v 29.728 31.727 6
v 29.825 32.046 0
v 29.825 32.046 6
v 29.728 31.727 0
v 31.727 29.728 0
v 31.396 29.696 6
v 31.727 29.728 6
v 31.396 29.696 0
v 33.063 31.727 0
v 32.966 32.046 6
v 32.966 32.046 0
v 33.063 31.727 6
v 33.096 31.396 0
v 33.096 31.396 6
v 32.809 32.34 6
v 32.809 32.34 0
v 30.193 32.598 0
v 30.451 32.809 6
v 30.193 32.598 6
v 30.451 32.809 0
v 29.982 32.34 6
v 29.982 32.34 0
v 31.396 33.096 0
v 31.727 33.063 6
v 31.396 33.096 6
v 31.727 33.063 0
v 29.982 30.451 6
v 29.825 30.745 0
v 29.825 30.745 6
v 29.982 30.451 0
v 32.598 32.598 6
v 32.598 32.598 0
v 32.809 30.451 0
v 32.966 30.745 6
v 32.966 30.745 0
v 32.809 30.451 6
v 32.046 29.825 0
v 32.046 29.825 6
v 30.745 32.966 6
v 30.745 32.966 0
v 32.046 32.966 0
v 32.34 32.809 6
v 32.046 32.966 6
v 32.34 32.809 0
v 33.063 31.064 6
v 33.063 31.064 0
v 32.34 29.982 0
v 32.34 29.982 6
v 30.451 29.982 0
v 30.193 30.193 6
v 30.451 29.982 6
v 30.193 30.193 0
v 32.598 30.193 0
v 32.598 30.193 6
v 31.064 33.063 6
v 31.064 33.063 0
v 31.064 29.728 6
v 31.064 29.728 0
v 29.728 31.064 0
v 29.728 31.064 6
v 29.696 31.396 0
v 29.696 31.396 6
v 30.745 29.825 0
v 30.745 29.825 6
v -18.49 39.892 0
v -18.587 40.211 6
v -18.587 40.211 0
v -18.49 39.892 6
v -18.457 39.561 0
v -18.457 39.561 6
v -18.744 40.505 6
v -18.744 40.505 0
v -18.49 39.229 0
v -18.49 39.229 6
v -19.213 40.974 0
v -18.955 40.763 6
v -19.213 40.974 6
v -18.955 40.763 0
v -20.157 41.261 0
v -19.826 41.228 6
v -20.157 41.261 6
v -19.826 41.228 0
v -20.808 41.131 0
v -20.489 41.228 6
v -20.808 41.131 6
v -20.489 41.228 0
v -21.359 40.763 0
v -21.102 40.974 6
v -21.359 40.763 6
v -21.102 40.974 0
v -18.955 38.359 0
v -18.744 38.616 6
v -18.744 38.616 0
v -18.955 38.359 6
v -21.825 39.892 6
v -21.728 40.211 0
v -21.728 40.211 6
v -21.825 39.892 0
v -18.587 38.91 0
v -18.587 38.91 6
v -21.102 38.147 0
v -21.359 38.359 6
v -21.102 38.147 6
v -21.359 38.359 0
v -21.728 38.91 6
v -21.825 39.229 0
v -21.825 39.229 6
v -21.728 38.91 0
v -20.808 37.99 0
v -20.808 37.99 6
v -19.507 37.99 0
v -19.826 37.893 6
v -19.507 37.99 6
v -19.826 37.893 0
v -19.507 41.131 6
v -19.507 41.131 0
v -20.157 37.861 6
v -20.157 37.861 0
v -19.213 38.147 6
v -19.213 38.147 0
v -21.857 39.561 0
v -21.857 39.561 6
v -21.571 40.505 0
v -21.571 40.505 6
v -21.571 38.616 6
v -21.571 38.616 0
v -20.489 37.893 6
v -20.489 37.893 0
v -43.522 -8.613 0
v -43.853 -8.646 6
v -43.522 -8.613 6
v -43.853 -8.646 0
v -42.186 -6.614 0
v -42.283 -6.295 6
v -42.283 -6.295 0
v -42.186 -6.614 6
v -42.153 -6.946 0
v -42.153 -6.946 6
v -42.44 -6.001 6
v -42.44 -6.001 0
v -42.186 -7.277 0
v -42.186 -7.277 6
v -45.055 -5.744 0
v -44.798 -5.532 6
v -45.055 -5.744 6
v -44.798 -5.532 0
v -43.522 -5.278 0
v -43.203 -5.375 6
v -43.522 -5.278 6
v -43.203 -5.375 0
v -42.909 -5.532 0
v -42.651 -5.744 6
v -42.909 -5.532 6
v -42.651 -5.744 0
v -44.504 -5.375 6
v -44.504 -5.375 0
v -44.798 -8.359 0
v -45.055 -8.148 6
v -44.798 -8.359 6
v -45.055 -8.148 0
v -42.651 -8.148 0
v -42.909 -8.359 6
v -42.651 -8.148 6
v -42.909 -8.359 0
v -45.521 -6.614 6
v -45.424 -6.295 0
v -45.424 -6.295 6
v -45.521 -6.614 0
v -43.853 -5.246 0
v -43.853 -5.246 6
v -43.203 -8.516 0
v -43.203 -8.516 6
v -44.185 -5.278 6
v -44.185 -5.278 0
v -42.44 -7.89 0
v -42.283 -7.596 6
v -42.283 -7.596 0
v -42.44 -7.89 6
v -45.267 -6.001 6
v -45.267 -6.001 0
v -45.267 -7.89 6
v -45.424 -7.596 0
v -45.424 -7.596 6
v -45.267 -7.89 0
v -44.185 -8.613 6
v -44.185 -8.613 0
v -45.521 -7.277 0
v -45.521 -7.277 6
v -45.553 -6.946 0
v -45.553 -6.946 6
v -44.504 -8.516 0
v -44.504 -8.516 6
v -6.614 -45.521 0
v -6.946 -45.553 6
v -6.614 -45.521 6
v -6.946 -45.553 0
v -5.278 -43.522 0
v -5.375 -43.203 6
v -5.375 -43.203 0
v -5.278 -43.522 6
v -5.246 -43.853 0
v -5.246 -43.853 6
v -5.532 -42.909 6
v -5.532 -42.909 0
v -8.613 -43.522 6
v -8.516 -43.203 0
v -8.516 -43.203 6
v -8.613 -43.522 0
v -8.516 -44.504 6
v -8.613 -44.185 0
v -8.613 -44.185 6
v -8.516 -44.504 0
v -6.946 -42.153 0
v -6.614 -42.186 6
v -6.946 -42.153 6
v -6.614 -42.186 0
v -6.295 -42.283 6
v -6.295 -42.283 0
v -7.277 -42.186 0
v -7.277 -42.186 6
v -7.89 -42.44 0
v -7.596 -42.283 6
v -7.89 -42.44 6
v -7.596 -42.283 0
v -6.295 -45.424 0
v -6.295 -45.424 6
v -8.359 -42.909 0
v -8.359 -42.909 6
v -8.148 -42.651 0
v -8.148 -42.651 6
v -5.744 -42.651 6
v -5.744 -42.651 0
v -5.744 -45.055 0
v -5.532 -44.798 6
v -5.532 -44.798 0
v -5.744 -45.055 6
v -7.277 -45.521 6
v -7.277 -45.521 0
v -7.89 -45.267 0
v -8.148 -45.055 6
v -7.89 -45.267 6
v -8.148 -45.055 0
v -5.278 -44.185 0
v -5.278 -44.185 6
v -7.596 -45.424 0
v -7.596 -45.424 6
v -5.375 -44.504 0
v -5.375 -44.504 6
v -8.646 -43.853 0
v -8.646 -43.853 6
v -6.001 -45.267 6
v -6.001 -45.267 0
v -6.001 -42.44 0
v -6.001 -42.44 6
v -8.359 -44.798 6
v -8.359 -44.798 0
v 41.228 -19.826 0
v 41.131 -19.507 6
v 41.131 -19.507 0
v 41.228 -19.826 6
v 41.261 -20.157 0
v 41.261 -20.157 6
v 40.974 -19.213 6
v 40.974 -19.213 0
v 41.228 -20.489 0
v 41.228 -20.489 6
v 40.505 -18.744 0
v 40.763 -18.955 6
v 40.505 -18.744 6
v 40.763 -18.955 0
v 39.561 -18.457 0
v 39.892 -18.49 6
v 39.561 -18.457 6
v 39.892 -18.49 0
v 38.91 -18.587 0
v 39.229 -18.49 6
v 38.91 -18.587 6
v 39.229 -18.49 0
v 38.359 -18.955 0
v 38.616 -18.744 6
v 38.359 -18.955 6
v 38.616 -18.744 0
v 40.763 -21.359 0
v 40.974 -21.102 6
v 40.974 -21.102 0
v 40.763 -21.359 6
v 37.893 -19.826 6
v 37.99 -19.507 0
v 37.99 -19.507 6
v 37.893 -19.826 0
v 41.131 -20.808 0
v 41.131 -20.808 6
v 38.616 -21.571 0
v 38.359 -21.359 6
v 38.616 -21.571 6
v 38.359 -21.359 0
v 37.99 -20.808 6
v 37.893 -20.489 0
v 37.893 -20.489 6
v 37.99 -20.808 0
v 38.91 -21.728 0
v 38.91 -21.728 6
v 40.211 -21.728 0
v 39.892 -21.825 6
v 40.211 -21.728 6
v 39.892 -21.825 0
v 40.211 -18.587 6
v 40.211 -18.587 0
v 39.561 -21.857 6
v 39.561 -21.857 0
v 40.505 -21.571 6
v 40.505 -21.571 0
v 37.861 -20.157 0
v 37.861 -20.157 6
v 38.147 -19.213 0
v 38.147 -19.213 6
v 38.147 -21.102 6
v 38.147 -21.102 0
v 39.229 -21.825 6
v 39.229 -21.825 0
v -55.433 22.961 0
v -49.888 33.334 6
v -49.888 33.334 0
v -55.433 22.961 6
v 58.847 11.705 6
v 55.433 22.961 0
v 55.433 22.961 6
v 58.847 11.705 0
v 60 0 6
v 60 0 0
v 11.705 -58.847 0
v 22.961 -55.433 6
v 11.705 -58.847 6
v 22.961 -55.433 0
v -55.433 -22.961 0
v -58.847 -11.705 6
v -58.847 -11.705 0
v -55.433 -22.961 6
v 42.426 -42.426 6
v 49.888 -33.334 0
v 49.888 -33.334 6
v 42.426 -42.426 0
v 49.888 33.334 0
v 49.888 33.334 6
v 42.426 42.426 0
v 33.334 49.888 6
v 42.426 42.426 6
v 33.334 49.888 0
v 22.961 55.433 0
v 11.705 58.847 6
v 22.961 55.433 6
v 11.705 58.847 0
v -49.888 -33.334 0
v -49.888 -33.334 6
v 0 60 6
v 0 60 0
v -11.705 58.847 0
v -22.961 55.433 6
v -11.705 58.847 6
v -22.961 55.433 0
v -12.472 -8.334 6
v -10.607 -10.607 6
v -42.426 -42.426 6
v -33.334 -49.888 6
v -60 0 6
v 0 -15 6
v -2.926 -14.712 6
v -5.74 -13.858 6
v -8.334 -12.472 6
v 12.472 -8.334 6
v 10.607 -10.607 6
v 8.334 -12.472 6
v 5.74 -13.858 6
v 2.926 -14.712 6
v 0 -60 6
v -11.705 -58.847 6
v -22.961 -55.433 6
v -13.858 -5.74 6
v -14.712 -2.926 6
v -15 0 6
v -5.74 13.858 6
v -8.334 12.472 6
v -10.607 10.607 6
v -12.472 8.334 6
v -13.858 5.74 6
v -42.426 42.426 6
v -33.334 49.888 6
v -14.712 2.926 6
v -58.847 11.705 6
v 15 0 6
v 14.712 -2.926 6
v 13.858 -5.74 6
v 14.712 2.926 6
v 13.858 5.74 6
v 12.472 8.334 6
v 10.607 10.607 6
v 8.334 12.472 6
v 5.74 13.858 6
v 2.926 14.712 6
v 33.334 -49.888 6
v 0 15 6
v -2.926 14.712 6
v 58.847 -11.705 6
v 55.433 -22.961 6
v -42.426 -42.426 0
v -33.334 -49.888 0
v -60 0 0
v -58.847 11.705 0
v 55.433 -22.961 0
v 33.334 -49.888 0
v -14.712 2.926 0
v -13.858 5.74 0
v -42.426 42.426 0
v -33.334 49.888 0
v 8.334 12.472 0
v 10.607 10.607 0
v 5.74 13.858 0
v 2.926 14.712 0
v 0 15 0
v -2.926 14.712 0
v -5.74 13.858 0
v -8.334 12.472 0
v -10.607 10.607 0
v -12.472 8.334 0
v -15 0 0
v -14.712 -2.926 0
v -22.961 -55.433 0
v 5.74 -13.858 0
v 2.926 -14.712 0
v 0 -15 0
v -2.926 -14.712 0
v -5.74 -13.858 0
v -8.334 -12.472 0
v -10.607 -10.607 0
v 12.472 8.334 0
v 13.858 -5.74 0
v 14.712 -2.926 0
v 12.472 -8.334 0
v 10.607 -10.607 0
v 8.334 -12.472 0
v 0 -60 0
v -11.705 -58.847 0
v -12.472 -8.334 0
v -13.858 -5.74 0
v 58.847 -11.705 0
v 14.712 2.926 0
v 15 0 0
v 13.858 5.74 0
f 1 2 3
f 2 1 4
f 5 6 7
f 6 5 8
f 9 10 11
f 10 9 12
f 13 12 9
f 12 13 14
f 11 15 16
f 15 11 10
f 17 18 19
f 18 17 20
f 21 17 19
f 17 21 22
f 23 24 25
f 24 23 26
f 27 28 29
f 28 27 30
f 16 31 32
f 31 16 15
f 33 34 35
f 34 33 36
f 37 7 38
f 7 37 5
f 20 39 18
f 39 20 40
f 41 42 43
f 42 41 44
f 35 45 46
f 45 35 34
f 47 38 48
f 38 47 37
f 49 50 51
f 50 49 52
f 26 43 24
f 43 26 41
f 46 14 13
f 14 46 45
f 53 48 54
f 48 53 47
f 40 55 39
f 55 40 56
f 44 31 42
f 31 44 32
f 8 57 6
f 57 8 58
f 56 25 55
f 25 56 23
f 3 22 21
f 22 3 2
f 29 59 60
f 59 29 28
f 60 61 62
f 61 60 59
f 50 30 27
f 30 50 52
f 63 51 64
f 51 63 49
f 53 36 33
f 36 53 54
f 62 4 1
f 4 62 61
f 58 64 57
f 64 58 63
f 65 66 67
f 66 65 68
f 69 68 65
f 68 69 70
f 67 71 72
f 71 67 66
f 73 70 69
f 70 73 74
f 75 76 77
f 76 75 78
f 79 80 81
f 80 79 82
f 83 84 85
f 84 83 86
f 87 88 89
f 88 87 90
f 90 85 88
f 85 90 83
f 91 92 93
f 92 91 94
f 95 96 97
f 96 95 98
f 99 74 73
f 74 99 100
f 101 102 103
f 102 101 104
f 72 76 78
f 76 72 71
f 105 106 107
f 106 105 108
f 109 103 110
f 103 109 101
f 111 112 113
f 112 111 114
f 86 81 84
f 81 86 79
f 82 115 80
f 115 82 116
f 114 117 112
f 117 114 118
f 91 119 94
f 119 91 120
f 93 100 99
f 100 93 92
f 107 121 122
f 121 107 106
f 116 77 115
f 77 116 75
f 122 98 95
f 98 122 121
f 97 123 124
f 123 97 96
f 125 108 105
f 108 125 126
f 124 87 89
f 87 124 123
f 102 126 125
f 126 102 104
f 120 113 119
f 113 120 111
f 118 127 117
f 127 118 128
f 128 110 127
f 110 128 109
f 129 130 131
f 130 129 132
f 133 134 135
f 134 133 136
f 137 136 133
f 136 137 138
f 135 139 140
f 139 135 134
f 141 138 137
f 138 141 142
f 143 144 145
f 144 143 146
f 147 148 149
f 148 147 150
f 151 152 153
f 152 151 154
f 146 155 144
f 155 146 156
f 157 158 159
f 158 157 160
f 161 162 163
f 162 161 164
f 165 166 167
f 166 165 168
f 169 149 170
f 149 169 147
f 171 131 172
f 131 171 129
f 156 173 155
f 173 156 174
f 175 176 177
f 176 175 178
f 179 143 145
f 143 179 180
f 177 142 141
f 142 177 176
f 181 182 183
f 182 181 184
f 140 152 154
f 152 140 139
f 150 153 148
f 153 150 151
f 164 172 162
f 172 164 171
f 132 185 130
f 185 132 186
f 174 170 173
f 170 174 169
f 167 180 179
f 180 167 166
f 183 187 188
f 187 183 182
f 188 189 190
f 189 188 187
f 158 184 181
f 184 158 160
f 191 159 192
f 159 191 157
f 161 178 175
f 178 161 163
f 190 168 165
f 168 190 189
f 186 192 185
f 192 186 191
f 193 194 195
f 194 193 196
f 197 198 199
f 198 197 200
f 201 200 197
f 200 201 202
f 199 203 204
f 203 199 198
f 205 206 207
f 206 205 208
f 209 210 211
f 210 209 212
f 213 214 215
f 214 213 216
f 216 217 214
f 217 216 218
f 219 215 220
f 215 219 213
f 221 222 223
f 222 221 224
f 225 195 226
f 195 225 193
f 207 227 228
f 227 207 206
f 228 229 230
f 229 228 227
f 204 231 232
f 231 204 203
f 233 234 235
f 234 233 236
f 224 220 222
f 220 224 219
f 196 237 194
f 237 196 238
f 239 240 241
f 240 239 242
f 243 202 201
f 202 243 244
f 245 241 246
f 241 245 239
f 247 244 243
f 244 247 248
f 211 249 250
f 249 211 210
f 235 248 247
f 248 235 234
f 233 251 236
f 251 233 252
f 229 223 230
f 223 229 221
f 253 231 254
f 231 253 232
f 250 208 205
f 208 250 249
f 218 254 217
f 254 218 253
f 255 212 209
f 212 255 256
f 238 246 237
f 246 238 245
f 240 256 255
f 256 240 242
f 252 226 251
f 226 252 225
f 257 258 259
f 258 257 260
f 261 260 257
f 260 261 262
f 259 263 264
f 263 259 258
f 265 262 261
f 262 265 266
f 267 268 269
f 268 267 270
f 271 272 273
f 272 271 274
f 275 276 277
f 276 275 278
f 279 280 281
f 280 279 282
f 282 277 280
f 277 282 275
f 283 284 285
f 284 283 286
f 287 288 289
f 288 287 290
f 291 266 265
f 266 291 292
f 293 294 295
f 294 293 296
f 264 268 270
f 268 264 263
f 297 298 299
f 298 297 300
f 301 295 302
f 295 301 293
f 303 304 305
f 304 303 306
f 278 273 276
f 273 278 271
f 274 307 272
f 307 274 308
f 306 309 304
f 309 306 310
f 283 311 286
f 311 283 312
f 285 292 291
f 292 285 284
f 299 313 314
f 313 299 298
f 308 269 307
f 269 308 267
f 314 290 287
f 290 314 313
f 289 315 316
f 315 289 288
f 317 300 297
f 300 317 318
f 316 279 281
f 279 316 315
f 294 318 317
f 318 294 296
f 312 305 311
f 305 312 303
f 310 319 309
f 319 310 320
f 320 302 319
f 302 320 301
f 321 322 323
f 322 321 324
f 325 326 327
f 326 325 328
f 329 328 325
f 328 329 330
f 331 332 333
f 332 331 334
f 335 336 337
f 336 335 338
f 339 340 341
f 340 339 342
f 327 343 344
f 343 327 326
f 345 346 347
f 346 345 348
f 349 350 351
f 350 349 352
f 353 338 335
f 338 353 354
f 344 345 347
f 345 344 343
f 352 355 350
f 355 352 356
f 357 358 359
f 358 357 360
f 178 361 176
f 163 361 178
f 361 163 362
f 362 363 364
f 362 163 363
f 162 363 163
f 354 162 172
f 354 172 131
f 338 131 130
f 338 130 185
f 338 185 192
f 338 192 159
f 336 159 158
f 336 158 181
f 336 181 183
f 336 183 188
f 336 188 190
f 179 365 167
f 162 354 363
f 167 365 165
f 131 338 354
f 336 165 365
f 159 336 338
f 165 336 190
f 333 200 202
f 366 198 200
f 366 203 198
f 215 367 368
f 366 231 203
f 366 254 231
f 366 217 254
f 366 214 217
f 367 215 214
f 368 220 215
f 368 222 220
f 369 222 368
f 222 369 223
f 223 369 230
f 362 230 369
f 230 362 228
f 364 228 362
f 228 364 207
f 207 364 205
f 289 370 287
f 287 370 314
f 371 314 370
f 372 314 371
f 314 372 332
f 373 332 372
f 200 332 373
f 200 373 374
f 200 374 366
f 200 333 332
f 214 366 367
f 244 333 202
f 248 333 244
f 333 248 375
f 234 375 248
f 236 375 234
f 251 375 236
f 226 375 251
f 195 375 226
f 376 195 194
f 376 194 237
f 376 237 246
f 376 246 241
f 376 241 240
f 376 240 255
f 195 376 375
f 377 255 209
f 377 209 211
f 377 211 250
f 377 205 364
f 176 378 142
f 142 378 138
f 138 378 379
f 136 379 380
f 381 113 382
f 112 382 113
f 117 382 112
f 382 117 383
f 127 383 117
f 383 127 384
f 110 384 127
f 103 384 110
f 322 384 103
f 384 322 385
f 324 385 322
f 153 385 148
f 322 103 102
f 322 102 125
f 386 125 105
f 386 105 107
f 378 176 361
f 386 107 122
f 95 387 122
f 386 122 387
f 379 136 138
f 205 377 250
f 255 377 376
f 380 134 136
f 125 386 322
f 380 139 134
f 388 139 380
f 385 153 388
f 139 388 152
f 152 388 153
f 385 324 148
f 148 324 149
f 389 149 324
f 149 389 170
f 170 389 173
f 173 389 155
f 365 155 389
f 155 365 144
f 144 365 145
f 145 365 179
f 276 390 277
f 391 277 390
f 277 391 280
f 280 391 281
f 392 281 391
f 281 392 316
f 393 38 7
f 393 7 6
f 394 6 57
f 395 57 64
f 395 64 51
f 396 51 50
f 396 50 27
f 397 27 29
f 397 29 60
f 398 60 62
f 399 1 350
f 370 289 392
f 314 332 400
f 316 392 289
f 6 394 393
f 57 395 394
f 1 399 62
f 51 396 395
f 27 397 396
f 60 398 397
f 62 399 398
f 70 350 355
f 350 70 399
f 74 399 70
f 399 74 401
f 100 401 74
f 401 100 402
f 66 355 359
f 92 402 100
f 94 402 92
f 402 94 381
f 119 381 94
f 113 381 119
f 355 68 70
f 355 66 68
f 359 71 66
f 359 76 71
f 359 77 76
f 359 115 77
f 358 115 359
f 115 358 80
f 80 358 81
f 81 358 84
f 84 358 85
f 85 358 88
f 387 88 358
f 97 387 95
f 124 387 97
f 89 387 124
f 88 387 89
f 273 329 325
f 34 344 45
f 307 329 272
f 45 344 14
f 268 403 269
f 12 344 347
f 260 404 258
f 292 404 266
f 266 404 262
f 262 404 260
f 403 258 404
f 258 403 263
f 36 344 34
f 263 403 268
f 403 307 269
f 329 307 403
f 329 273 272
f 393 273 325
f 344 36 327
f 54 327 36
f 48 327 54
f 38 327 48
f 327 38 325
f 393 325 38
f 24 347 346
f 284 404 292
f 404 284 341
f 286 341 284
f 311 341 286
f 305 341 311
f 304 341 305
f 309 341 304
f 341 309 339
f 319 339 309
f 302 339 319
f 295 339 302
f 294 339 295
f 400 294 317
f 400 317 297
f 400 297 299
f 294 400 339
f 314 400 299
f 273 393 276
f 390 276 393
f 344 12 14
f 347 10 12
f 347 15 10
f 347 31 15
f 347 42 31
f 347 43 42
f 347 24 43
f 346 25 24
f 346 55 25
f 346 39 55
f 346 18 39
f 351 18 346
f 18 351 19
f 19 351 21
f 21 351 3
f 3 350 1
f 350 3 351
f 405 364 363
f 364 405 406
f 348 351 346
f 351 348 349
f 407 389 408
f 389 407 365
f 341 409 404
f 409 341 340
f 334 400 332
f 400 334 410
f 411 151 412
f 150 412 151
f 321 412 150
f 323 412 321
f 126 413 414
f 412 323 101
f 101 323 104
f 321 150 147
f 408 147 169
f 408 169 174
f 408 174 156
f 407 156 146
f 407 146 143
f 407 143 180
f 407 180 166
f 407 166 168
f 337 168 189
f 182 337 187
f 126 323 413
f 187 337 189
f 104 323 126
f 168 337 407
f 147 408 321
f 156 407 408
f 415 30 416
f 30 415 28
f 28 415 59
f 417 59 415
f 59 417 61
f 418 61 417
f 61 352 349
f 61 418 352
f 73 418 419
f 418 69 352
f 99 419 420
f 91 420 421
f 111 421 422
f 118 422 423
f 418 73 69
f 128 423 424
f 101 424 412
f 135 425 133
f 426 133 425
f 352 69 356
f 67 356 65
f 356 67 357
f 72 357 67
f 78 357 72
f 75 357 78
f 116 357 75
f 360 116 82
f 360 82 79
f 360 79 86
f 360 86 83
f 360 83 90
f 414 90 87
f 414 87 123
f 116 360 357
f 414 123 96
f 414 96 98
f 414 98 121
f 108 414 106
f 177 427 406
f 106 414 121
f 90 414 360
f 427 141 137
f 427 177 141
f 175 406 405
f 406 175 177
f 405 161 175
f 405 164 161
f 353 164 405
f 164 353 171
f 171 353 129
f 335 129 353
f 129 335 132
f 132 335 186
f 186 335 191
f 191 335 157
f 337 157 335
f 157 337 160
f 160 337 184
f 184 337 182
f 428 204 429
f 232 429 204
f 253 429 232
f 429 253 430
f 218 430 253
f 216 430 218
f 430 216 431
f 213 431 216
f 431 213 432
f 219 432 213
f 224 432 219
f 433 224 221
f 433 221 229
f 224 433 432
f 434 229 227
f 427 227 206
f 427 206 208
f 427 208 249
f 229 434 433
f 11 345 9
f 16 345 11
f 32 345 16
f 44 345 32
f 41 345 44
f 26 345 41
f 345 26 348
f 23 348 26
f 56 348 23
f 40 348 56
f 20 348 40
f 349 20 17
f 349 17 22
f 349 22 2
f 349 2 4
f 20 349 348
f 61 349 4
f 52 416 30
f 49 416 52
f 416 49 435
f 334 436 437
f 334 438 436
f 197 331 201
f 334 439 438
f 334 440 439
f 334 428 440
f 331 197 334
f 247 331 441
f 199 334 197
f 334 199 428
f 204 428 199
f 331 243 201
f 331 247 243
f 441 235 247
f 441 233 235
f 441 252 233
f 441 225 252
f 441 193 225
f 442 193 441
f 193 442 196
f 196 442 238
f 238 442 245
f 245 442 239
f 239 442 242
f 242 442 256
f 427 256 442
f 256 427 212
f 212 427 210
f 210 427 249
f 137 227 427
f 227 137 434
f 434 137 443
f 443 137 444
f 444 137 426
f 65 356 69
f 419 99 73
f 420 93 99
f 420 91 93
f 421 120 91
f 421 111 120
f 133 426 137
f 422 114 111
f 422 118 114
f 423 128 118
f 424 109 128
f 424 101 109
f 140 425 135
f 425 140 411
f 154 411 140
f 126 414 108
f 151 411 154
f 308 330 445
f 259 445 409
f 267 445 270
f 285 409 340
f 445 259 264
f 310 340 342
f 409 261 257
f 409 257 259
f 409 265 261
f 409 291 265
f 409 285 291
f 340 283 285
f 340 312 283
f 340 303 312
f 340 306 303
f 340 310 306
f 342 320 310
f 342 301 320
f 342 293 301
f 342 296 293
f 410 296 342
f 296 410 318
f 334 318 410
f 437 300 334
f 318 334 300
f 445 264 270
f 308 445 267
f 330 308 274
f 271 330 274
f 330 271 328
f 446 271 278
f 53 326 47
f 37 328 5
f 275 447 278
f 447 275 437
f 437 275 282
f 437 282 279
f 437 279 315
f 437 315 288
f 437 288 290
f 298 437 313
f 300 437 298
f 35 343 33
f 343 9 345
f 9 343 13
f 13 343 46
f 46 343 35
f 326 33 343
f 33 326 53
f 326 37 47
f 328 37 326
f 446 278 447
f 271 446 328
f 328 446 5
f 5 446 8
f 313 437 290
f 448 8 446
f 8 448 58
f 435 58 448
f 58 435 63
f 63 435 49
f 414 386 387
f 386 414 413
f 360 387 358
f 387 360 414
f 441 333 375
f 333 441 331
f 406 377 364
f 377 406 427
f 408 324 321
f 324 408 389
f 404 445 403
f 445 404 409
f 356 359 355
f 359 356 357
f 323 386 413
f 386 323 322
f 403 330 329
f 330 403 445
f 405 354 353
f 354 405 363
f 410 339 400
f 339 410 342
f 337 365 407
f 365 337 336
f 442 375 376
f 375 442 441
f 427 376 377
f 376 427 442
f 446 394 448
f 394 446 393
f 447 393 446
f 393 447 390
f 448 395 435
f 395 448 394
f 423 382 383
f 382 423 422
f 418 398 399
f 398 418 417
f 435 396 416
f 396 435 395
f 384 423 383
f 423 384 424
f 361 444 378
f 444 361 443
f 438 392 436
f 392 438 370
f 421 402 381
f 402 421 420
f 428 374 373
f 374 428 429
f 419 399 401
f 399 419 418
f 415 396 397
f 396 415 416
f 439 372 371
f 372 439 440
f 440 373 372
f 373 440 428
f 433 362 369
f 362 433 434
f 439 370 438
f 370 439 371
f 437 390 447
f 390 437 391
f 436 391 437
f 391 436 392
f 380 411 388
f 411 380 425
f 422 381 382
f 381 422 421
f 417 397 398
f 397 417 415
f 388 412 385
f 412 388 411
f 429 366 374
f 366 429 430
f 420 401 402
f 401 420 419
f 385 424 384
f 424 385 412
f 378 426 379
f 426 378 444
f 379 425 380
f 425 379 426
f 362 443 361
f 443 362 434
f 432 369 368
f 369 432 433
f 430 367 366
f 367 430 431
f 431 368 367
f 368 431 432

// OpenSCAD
$fn = 32;

// ----------------------------------------------------------------------
// Flange Ø120 x 6
// 5 holes on a Ø88.8 bolt circle, bolted joints
// ----------------------------------------------------------------------

// --- parameters (mm) ---
flange_d = 120;  // outside diameter of the flange
thickness = 6;   // flange thickness
holes = 5;       // number of bolt holes
pcd = 88.8;      // bolt circle diameter
start_deg = 45;  // angle of the first hole, from +X
hole_d = 3.4;    // bolt hole diameter
bore_d = 30;     // central through bore
hub_d = 40;      // hub outside diameter
hub_h = 0;       // hub height above the flange face (0 = no hub)

// --- derived feature positions (mm) ---
height = thickness + hub_h;  // = 6   overall height of the part
pcd_r = pcd / 2;             // = 44.4   bolt circle radius
hole_step = 360 / holes;     // = 72   angular pitch
feature_centers = [
  [pcd_r * cos(start_deg + 0 * hole_step), pcd_r * sin(start_deg + 0 * hole_step)],
  [pcd_r * cos(start_deg + 1 * hole_step), pcd_r * sin(start_deg + 1 * hole_step)],
  [pcd_r * cos(start_deg + 2 * hole_step), pcd_r * sin(start_deg + 2 * hole_step)],
  [pcd_r * cos(start_deg + 3 * hole_step), pcd_r * sin(start_deg + 3 * hole_step)],
  [pcd_r * cos(start_deg + 4 * hole_step), pcd_r * sin(start_deg + 4 * hole_step)]
];   // bolt hole centres on the pitch circle

// flange disc, every hole and the bore cut straight through
difference() {
  union() {
    cylinder(d = flange_d, h = thickness);
  }
  translate([0, 0, -1]) cylinder(d = bore_d, h = height + 2);  // bore, through
  for (centre = feature_centers)
    translate([centre[0], centre[1], -1]) cylinder(d = hole_d, h = thickness + 2);
}
